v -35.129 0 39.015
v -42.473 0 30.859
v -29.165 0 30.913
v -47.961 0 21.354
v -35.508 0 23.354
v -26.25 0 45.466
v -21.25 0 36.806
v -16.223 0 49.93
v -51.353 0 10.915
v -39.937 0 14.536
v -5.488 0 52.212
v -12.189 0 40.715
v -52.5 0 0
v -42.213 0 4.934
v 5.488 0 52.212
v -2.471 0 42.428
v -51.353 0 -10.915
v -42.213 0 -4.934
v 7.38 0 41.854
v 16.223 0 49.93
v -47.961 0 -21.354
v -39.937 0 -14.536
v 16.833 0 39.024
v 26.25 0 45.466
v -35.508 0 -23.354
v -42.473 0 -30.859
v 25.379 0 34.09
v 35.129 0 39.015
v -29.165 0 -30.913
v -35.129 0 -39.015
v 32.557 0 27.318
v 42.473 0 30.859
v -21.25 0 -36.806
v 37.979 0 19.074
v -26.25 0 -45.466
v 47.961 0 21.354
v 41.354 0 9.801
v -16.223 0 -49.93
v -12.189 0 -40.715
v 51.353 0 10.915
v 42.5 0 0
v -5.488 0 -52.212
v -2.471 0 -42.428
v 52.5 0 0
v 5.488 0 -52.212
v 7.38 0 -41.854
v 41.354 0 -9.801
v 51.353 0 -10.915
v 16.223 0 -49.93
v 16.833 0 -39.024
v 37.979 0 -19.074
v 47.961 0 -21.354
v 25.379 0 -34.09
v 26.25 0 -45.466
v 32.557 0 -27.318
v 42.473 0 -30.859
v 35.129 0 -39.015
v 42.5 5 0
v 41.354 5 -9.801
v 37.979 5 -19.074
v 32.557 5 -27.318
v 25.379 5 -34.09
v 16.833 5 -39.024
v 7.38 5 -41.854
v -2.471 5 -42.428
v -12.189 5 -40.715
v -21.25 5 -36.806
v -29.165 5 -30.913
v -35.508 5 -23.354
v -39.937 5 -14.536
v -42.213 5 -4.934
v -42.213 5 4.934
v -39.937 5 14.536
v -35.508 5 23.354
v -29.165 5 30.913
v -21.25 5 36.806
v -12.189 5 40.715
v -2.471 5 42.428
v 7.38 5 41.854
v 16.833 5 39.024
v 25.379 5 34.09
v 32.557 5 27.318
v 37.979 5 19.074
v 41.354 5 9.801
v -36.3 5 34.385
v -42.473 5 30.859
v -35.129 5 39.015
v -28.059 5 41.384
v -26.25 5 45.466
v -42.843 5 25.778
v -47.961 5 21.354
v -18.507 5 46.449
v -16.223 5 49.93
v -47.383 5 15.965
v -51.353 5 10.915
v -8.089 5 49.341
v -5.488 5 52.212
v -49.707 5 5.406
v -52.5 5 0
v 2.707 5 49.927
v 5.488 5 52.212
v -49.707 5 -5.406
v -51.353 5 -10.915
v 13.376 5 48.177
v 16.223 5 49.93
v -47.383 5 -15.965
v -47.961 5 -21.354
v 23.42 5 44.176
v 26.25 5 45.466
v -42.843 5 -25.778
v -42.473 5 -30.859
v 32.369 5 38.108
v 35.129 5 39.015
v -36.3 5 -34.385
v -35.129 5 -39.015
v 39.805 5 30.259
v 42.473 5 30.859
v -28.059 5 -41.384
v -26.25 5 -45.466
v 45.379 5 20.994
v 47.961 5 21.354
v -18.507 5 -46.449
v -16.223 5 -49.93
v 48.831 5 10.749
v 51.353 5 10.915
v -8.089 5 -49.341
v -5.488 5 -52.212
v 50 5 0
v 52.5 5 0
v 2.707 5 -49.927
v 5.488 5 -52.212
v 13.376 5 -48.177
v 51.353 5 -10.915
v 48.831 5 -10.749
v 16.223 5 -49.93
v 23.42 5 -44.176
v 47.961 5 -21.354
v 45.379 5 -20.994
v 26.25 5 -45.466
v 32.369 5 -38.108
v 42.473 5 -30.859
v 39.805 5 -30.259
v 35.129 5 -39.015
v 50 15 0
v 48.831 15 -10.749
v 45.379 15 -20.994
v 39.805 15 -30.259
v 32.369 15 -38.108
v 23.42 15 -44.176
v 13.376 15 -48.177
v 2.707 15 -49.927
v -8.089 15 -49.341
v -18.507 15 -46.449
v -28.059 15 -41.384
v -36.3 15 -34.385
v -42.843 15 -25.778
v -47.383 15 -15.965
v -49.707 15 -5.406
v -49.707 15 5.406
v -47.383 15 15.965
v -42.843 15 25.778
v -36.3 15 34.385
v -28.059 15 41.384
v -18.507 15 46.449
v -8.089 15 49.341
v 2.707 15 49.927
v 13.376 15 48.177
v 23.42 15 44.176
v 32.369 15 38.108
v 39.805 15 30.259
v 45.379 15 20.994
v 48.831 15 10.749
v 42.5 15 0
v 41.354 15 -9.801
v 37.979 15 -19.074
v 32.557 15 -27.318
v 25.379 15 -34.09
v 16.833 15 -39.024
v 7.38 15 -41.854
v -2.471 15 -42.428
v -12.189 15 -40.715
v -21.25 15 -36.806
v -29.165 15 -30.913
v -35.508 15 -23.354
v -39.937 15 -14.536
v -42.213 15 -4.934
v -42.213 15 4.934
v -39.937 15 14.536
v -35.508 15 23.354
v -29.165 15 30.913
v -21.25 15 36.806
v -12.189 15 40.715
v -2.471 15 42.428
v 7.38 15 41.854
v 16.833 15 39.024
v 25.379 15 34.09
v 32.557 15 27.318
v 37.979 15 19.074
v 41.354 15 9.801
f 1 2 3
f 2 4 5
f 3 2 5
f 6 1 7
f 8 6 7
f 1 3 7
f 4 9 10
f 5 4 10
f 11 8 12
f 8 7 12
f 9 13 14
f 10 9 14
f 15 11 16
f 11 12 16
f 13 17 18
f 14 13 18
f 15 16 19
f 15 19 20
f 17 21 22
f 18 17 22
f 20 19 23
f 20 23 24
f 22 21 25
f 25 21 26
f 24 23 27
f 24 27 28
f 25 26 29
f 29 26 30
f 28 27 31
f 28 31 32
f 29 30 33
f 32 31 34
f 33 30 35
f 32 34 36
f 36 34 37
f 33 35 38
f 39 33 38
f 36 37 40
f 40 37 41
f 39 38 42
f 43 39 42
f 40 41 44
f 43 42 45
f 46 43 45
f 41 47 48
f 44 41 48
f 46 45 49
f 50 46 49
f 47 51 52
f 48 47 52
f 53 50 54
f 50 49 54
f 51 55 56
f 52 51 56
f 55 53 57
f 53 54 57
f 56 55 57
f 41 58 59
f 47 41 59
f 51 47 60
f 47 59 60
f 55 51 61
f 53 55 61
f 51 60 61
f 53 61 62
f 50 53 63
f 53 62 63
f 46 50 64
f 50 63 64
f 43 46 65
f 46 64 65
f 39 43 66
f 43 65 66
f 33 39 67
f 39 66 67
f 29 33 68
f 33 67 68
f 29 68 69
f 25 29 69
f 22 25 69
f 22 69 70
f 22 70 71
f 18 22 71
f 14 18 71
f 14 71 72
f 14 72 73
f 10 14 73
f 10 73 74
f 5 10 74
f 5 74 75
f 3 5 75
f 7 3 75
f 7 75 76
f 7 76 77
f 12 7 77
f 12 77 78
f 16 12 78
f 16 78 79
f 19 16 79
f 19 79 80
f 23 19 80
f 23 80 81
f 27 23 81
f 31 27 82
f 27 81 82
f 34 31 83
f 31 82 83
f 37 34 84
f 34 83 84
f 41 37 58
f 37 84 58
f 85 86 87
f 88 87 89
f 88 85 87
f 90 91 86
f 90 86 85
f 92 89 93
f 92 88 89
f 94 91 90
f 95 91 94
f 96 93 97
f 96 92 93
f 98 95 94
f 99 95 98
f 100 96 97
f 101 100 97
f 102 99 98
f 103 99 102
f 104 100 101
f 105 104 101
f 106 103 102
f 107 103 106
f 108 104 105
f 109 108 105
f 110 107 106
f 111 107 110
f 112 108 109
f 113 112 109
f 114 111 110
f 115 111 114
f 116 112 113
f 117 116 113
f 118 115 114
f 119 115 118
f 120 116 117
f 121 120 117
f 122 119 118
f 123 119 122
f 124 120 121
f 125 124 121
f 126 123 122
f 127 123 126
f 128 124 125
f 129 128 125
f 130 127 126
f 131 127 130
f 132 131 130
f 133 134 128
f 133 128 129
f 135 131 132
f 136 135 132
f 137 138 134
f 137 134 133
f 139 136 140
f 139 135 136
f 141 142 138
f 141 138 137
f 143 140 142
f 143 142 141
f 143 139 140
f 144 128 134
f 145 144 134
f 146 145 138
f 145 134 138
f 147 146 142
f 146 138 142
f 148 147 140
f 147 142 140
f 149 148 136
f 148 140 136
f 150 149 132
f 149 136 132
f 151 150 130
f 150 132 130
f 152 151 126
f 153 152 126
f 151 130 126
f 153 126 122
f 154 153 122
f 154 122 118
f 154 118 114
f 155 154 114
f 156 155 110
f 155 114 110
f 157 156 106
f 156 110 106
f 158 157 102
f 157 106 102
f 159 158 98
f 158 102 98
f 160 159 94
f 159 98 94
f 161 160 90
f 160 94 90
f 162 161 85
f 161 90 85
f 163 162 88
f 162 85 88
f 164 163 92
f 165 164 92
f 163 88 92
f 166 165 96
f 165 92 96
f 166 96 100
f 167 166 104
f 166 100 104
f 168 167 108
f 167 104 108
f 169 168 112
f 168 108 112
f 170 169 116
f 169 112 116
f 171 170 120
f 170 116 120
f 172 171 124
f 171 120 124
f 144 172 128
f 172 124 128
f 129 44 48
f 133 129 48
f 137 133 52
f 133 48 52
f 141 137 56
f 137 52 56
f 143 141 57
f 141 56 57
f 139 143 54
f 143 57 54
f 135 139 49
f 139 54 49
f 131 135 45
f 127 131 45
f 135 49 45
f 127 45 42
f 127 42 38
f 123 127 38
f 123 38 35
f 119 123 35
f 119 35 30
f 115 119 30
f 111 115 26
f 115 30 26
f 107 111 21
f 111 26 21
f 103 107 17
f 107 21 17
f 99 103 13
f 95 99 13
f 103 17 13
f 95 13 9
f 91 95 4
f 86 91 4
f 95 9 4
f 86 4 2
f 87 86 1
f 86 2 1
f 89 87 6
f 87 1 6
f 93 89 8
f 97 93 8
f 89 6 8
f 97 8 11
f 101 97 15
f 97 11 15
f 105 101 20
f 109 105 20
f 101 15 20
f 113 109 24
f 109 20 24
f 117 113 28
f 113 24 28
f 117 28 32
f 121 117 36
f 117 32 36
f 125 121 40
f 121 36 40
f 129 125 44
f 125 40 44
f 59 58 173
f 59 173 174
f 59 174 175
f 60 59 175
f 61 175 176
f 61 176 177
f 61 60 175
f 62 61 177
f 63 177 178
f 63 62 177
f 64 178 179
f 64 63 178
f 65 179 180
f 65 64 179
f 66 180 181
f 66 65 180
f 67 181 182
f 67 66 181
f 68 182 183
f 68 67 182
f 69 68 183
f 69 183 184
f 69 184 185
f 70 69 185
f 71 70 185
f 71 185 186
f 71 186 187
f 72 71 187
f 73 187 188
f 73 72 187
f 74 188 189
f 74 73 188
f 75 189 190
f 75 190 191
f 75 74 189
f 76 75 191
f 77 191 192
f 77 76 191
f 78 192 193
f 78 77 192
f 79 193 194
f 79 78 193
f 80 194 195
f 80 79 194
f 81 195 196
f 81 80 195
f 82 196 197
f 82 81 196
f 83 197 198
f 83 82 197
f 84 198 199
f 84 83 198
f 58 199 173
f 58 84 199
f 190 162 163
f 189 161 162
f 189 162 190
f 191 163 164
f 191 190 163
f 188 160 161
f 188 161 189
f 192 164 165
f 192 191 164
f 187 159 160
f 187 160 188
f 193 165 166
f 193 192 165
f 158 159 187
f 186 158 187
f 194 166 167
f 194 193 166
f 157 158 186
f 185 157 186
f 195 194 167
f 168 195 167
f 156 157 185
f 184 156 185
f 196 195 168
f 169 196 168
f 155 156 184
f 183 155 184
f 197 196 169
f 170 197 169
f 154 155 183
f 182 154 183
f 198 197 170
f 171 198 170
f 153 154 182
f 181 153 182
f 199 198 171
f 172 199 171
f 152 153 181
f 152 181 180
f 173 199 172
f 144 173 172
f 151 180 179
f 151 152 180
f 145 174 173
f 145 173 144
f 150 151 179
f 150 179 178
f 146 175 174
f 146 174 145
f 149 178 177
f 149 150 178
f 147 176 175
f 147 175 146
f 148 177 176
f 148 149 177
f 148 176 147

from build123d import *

# Parameters (mm, degrees)
SKETCH1_R           = 52.5
BOSS_EXTRUDE1_DEPTH = 5
SKETCH2_R           = 50
SKETCH2_R_2         = 42.5
BOSS_EXTRUDE2_DEPTH = 10
SKETCH3_R           = 42.5
CUT_EXTRUDE1_DEPTH  = 6


with BuildPart() as part:
    # Sketch1 → Boss-Extrude1 (new body)
    with BuildSketch(Plane(origin=(0, 0, 0), x_dir=(1, 0, 0), z_dir=(0, 1, 0))):
        Circle(SKETCH1_R)
    extrude(amount=BOSS_EXTRUDE1_DEPTH)

    # Sketch2 → Boss-Extrude2 (add)
    with BuildSketch(Plane(origin=(0, 5, 0), x_dir=(1, 0, 0), z_dir=(0, 1, 0))):
        Circle(SKETCH2_R)
        Circle(SKETCH2_R_2, mode=Mode.SUBTRACT)
    extrude(amount=BOSS_EXTRUDE2_DEPTH)

    # Sketch3 → Cut-Extrude1 (cut, through all)
    with BuildSketch(Plane(origin=(0, 5, 0), x_dir=(1, 0, 0), z_dir=(0, 1, 0))):
        Circle(SKETCH3_R)
    extrude(amount=-CUT_EXTRUDE1_DEPTH, mode=Mode.SUBTRACT)


solid = part.part
